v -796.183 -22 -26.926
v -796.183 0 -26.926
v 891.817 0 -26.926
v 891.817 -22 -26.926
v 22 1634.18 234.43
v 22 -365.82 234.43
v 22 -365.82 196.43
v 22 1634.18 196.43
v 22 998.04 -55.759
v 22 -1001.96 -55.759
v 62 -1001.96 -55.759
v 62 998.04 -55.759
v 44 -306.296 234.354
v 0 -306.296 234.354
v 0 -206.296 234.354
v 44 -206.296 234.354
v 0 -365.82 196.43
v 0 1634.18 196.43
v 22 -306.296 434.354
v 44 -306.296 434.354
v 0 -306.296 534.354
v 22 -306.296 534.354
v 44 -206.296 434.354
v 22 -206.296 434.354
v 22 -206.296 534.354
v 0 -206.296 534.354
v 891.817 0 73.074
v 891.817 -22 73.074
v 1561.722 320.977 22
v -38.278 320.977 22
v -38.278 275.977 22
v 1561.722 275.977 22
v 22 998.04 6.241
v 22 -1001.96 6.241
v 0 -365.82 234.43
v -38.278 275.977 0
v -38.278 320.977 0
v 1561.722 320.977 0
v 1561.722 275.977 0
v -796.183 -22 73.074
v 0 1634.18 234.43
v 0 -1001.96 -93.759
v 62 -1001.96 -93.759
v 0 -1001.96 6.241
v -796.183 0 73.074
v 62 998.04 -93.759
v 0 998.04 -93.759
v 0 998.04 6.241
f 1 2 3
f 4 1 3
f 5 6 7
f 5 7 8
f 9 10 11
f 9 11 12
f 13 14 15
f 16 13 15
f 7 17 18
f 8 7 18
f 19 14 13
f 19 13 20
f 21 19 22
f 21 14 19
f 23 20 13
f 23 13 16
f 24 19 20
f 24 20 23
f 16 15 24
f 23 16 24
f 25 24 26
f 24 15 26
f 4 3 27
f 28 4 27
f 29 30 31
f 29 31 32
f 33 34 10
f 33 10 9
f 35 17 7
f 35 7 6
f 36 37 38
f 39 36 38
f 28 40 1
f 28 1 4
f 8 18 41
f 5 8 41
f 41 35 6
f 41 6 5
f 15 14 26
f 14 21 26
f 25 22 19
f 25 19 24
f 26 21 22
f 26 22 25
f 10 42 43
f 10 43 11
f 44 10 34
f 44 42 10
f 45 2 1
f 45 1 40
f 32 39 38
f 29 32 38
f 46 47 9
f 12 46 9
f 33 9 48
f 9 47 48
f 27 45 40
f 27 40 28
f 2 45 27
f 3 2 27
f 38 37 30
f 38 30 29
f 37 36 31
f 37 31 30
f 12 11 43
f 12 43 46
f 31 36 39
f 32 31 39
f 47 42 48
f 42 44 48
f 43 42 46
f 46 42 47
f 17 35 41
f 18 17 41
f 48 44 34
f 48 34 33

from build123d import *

# Parameters (mm, degrees)
F1_W      = 2000
F1_H      = 62
F2_DEPTH  = 22
F1_H_2    = 38
F3_DEPTH  = 62
F4_W      = 1688
F4_H      = 100
F5_DEPTH  = 22
F6_W      = 2000
F6_H      = 38
F7_DEPTH  = 22
F8_W      = 1600
F8_H      = 45
F9_DEPTH  = 22
F10_W     = 100
F10_H     = 100
F11_DEPTH = 22
F10_H_2   = 200
F12_DEPTH = 44


with BuildPart() as f2:
    # F1 (on Right) → F2 (new body)
    with BuildSketch(Plane.YZ):
        with Locations((-1.9598416984, -24.7590313256)):
            Rectangle(F1_W, F1_H)
    extrude(amount=F2_DEPTH)

    # F1 (on Right) → F3 (join)
    with BuildSketch(Plane.YZ):
        with Locations((-1.9598416984, -74.7590313256)):
            Rectangle(F1_W, F1_H_2)
    extrude(amount=F3_DEPTH)


with BuildPart() as f5:
    # F4 (on Front) → F5 (new body)
    with BuildSketch(Plane.XZ):
        with Locations((47.8171780705, 23.0740644909)):
            Rectangle(F4_W, F4_H)
    extrude(amount=F5_DEPTH)


with BuildPart() as f7:
    # F6 (on Right) → F7 (new body)
    with BuildSketch(Plane.YZ):
        with Locations((634.180099352, 215.4298871756)):
            Rectangle(F6_W, F6_H)
    extrude(amount=F7_DEPTH)


with BuildPart() as f9:
    # F8 (on Top) → F9 (new body)
    with BuildSketch(Plane.XY):
        with Locations((761.7220133543, 298.4766468961)):
            Rectangle(F8_W, F8_H)
    extrude(amount=F9_DEPTH)


with BuildPart() as f11:
    # F10 (on Right) → F11 (new body)
    with BuildSketch(Plane.YZ):
        with Locations((-256.2956437469, 484.3538582325)):
            Rectangle(F10_W, F10_H)
    extrude(amount=F11_DEPTH)

    # F10 (on Right) → F12 (join)
    with BuildSketch(Plane.YZ):
        with Locations((-256.2956437469, 334.3538582325)):
            Rectangle(F10_W, F10_H_2)
    extrude(amount=F12_DEPTH)


solid = Compound([f2.part, f5.part, f7.part, f9.part, f11.part])
